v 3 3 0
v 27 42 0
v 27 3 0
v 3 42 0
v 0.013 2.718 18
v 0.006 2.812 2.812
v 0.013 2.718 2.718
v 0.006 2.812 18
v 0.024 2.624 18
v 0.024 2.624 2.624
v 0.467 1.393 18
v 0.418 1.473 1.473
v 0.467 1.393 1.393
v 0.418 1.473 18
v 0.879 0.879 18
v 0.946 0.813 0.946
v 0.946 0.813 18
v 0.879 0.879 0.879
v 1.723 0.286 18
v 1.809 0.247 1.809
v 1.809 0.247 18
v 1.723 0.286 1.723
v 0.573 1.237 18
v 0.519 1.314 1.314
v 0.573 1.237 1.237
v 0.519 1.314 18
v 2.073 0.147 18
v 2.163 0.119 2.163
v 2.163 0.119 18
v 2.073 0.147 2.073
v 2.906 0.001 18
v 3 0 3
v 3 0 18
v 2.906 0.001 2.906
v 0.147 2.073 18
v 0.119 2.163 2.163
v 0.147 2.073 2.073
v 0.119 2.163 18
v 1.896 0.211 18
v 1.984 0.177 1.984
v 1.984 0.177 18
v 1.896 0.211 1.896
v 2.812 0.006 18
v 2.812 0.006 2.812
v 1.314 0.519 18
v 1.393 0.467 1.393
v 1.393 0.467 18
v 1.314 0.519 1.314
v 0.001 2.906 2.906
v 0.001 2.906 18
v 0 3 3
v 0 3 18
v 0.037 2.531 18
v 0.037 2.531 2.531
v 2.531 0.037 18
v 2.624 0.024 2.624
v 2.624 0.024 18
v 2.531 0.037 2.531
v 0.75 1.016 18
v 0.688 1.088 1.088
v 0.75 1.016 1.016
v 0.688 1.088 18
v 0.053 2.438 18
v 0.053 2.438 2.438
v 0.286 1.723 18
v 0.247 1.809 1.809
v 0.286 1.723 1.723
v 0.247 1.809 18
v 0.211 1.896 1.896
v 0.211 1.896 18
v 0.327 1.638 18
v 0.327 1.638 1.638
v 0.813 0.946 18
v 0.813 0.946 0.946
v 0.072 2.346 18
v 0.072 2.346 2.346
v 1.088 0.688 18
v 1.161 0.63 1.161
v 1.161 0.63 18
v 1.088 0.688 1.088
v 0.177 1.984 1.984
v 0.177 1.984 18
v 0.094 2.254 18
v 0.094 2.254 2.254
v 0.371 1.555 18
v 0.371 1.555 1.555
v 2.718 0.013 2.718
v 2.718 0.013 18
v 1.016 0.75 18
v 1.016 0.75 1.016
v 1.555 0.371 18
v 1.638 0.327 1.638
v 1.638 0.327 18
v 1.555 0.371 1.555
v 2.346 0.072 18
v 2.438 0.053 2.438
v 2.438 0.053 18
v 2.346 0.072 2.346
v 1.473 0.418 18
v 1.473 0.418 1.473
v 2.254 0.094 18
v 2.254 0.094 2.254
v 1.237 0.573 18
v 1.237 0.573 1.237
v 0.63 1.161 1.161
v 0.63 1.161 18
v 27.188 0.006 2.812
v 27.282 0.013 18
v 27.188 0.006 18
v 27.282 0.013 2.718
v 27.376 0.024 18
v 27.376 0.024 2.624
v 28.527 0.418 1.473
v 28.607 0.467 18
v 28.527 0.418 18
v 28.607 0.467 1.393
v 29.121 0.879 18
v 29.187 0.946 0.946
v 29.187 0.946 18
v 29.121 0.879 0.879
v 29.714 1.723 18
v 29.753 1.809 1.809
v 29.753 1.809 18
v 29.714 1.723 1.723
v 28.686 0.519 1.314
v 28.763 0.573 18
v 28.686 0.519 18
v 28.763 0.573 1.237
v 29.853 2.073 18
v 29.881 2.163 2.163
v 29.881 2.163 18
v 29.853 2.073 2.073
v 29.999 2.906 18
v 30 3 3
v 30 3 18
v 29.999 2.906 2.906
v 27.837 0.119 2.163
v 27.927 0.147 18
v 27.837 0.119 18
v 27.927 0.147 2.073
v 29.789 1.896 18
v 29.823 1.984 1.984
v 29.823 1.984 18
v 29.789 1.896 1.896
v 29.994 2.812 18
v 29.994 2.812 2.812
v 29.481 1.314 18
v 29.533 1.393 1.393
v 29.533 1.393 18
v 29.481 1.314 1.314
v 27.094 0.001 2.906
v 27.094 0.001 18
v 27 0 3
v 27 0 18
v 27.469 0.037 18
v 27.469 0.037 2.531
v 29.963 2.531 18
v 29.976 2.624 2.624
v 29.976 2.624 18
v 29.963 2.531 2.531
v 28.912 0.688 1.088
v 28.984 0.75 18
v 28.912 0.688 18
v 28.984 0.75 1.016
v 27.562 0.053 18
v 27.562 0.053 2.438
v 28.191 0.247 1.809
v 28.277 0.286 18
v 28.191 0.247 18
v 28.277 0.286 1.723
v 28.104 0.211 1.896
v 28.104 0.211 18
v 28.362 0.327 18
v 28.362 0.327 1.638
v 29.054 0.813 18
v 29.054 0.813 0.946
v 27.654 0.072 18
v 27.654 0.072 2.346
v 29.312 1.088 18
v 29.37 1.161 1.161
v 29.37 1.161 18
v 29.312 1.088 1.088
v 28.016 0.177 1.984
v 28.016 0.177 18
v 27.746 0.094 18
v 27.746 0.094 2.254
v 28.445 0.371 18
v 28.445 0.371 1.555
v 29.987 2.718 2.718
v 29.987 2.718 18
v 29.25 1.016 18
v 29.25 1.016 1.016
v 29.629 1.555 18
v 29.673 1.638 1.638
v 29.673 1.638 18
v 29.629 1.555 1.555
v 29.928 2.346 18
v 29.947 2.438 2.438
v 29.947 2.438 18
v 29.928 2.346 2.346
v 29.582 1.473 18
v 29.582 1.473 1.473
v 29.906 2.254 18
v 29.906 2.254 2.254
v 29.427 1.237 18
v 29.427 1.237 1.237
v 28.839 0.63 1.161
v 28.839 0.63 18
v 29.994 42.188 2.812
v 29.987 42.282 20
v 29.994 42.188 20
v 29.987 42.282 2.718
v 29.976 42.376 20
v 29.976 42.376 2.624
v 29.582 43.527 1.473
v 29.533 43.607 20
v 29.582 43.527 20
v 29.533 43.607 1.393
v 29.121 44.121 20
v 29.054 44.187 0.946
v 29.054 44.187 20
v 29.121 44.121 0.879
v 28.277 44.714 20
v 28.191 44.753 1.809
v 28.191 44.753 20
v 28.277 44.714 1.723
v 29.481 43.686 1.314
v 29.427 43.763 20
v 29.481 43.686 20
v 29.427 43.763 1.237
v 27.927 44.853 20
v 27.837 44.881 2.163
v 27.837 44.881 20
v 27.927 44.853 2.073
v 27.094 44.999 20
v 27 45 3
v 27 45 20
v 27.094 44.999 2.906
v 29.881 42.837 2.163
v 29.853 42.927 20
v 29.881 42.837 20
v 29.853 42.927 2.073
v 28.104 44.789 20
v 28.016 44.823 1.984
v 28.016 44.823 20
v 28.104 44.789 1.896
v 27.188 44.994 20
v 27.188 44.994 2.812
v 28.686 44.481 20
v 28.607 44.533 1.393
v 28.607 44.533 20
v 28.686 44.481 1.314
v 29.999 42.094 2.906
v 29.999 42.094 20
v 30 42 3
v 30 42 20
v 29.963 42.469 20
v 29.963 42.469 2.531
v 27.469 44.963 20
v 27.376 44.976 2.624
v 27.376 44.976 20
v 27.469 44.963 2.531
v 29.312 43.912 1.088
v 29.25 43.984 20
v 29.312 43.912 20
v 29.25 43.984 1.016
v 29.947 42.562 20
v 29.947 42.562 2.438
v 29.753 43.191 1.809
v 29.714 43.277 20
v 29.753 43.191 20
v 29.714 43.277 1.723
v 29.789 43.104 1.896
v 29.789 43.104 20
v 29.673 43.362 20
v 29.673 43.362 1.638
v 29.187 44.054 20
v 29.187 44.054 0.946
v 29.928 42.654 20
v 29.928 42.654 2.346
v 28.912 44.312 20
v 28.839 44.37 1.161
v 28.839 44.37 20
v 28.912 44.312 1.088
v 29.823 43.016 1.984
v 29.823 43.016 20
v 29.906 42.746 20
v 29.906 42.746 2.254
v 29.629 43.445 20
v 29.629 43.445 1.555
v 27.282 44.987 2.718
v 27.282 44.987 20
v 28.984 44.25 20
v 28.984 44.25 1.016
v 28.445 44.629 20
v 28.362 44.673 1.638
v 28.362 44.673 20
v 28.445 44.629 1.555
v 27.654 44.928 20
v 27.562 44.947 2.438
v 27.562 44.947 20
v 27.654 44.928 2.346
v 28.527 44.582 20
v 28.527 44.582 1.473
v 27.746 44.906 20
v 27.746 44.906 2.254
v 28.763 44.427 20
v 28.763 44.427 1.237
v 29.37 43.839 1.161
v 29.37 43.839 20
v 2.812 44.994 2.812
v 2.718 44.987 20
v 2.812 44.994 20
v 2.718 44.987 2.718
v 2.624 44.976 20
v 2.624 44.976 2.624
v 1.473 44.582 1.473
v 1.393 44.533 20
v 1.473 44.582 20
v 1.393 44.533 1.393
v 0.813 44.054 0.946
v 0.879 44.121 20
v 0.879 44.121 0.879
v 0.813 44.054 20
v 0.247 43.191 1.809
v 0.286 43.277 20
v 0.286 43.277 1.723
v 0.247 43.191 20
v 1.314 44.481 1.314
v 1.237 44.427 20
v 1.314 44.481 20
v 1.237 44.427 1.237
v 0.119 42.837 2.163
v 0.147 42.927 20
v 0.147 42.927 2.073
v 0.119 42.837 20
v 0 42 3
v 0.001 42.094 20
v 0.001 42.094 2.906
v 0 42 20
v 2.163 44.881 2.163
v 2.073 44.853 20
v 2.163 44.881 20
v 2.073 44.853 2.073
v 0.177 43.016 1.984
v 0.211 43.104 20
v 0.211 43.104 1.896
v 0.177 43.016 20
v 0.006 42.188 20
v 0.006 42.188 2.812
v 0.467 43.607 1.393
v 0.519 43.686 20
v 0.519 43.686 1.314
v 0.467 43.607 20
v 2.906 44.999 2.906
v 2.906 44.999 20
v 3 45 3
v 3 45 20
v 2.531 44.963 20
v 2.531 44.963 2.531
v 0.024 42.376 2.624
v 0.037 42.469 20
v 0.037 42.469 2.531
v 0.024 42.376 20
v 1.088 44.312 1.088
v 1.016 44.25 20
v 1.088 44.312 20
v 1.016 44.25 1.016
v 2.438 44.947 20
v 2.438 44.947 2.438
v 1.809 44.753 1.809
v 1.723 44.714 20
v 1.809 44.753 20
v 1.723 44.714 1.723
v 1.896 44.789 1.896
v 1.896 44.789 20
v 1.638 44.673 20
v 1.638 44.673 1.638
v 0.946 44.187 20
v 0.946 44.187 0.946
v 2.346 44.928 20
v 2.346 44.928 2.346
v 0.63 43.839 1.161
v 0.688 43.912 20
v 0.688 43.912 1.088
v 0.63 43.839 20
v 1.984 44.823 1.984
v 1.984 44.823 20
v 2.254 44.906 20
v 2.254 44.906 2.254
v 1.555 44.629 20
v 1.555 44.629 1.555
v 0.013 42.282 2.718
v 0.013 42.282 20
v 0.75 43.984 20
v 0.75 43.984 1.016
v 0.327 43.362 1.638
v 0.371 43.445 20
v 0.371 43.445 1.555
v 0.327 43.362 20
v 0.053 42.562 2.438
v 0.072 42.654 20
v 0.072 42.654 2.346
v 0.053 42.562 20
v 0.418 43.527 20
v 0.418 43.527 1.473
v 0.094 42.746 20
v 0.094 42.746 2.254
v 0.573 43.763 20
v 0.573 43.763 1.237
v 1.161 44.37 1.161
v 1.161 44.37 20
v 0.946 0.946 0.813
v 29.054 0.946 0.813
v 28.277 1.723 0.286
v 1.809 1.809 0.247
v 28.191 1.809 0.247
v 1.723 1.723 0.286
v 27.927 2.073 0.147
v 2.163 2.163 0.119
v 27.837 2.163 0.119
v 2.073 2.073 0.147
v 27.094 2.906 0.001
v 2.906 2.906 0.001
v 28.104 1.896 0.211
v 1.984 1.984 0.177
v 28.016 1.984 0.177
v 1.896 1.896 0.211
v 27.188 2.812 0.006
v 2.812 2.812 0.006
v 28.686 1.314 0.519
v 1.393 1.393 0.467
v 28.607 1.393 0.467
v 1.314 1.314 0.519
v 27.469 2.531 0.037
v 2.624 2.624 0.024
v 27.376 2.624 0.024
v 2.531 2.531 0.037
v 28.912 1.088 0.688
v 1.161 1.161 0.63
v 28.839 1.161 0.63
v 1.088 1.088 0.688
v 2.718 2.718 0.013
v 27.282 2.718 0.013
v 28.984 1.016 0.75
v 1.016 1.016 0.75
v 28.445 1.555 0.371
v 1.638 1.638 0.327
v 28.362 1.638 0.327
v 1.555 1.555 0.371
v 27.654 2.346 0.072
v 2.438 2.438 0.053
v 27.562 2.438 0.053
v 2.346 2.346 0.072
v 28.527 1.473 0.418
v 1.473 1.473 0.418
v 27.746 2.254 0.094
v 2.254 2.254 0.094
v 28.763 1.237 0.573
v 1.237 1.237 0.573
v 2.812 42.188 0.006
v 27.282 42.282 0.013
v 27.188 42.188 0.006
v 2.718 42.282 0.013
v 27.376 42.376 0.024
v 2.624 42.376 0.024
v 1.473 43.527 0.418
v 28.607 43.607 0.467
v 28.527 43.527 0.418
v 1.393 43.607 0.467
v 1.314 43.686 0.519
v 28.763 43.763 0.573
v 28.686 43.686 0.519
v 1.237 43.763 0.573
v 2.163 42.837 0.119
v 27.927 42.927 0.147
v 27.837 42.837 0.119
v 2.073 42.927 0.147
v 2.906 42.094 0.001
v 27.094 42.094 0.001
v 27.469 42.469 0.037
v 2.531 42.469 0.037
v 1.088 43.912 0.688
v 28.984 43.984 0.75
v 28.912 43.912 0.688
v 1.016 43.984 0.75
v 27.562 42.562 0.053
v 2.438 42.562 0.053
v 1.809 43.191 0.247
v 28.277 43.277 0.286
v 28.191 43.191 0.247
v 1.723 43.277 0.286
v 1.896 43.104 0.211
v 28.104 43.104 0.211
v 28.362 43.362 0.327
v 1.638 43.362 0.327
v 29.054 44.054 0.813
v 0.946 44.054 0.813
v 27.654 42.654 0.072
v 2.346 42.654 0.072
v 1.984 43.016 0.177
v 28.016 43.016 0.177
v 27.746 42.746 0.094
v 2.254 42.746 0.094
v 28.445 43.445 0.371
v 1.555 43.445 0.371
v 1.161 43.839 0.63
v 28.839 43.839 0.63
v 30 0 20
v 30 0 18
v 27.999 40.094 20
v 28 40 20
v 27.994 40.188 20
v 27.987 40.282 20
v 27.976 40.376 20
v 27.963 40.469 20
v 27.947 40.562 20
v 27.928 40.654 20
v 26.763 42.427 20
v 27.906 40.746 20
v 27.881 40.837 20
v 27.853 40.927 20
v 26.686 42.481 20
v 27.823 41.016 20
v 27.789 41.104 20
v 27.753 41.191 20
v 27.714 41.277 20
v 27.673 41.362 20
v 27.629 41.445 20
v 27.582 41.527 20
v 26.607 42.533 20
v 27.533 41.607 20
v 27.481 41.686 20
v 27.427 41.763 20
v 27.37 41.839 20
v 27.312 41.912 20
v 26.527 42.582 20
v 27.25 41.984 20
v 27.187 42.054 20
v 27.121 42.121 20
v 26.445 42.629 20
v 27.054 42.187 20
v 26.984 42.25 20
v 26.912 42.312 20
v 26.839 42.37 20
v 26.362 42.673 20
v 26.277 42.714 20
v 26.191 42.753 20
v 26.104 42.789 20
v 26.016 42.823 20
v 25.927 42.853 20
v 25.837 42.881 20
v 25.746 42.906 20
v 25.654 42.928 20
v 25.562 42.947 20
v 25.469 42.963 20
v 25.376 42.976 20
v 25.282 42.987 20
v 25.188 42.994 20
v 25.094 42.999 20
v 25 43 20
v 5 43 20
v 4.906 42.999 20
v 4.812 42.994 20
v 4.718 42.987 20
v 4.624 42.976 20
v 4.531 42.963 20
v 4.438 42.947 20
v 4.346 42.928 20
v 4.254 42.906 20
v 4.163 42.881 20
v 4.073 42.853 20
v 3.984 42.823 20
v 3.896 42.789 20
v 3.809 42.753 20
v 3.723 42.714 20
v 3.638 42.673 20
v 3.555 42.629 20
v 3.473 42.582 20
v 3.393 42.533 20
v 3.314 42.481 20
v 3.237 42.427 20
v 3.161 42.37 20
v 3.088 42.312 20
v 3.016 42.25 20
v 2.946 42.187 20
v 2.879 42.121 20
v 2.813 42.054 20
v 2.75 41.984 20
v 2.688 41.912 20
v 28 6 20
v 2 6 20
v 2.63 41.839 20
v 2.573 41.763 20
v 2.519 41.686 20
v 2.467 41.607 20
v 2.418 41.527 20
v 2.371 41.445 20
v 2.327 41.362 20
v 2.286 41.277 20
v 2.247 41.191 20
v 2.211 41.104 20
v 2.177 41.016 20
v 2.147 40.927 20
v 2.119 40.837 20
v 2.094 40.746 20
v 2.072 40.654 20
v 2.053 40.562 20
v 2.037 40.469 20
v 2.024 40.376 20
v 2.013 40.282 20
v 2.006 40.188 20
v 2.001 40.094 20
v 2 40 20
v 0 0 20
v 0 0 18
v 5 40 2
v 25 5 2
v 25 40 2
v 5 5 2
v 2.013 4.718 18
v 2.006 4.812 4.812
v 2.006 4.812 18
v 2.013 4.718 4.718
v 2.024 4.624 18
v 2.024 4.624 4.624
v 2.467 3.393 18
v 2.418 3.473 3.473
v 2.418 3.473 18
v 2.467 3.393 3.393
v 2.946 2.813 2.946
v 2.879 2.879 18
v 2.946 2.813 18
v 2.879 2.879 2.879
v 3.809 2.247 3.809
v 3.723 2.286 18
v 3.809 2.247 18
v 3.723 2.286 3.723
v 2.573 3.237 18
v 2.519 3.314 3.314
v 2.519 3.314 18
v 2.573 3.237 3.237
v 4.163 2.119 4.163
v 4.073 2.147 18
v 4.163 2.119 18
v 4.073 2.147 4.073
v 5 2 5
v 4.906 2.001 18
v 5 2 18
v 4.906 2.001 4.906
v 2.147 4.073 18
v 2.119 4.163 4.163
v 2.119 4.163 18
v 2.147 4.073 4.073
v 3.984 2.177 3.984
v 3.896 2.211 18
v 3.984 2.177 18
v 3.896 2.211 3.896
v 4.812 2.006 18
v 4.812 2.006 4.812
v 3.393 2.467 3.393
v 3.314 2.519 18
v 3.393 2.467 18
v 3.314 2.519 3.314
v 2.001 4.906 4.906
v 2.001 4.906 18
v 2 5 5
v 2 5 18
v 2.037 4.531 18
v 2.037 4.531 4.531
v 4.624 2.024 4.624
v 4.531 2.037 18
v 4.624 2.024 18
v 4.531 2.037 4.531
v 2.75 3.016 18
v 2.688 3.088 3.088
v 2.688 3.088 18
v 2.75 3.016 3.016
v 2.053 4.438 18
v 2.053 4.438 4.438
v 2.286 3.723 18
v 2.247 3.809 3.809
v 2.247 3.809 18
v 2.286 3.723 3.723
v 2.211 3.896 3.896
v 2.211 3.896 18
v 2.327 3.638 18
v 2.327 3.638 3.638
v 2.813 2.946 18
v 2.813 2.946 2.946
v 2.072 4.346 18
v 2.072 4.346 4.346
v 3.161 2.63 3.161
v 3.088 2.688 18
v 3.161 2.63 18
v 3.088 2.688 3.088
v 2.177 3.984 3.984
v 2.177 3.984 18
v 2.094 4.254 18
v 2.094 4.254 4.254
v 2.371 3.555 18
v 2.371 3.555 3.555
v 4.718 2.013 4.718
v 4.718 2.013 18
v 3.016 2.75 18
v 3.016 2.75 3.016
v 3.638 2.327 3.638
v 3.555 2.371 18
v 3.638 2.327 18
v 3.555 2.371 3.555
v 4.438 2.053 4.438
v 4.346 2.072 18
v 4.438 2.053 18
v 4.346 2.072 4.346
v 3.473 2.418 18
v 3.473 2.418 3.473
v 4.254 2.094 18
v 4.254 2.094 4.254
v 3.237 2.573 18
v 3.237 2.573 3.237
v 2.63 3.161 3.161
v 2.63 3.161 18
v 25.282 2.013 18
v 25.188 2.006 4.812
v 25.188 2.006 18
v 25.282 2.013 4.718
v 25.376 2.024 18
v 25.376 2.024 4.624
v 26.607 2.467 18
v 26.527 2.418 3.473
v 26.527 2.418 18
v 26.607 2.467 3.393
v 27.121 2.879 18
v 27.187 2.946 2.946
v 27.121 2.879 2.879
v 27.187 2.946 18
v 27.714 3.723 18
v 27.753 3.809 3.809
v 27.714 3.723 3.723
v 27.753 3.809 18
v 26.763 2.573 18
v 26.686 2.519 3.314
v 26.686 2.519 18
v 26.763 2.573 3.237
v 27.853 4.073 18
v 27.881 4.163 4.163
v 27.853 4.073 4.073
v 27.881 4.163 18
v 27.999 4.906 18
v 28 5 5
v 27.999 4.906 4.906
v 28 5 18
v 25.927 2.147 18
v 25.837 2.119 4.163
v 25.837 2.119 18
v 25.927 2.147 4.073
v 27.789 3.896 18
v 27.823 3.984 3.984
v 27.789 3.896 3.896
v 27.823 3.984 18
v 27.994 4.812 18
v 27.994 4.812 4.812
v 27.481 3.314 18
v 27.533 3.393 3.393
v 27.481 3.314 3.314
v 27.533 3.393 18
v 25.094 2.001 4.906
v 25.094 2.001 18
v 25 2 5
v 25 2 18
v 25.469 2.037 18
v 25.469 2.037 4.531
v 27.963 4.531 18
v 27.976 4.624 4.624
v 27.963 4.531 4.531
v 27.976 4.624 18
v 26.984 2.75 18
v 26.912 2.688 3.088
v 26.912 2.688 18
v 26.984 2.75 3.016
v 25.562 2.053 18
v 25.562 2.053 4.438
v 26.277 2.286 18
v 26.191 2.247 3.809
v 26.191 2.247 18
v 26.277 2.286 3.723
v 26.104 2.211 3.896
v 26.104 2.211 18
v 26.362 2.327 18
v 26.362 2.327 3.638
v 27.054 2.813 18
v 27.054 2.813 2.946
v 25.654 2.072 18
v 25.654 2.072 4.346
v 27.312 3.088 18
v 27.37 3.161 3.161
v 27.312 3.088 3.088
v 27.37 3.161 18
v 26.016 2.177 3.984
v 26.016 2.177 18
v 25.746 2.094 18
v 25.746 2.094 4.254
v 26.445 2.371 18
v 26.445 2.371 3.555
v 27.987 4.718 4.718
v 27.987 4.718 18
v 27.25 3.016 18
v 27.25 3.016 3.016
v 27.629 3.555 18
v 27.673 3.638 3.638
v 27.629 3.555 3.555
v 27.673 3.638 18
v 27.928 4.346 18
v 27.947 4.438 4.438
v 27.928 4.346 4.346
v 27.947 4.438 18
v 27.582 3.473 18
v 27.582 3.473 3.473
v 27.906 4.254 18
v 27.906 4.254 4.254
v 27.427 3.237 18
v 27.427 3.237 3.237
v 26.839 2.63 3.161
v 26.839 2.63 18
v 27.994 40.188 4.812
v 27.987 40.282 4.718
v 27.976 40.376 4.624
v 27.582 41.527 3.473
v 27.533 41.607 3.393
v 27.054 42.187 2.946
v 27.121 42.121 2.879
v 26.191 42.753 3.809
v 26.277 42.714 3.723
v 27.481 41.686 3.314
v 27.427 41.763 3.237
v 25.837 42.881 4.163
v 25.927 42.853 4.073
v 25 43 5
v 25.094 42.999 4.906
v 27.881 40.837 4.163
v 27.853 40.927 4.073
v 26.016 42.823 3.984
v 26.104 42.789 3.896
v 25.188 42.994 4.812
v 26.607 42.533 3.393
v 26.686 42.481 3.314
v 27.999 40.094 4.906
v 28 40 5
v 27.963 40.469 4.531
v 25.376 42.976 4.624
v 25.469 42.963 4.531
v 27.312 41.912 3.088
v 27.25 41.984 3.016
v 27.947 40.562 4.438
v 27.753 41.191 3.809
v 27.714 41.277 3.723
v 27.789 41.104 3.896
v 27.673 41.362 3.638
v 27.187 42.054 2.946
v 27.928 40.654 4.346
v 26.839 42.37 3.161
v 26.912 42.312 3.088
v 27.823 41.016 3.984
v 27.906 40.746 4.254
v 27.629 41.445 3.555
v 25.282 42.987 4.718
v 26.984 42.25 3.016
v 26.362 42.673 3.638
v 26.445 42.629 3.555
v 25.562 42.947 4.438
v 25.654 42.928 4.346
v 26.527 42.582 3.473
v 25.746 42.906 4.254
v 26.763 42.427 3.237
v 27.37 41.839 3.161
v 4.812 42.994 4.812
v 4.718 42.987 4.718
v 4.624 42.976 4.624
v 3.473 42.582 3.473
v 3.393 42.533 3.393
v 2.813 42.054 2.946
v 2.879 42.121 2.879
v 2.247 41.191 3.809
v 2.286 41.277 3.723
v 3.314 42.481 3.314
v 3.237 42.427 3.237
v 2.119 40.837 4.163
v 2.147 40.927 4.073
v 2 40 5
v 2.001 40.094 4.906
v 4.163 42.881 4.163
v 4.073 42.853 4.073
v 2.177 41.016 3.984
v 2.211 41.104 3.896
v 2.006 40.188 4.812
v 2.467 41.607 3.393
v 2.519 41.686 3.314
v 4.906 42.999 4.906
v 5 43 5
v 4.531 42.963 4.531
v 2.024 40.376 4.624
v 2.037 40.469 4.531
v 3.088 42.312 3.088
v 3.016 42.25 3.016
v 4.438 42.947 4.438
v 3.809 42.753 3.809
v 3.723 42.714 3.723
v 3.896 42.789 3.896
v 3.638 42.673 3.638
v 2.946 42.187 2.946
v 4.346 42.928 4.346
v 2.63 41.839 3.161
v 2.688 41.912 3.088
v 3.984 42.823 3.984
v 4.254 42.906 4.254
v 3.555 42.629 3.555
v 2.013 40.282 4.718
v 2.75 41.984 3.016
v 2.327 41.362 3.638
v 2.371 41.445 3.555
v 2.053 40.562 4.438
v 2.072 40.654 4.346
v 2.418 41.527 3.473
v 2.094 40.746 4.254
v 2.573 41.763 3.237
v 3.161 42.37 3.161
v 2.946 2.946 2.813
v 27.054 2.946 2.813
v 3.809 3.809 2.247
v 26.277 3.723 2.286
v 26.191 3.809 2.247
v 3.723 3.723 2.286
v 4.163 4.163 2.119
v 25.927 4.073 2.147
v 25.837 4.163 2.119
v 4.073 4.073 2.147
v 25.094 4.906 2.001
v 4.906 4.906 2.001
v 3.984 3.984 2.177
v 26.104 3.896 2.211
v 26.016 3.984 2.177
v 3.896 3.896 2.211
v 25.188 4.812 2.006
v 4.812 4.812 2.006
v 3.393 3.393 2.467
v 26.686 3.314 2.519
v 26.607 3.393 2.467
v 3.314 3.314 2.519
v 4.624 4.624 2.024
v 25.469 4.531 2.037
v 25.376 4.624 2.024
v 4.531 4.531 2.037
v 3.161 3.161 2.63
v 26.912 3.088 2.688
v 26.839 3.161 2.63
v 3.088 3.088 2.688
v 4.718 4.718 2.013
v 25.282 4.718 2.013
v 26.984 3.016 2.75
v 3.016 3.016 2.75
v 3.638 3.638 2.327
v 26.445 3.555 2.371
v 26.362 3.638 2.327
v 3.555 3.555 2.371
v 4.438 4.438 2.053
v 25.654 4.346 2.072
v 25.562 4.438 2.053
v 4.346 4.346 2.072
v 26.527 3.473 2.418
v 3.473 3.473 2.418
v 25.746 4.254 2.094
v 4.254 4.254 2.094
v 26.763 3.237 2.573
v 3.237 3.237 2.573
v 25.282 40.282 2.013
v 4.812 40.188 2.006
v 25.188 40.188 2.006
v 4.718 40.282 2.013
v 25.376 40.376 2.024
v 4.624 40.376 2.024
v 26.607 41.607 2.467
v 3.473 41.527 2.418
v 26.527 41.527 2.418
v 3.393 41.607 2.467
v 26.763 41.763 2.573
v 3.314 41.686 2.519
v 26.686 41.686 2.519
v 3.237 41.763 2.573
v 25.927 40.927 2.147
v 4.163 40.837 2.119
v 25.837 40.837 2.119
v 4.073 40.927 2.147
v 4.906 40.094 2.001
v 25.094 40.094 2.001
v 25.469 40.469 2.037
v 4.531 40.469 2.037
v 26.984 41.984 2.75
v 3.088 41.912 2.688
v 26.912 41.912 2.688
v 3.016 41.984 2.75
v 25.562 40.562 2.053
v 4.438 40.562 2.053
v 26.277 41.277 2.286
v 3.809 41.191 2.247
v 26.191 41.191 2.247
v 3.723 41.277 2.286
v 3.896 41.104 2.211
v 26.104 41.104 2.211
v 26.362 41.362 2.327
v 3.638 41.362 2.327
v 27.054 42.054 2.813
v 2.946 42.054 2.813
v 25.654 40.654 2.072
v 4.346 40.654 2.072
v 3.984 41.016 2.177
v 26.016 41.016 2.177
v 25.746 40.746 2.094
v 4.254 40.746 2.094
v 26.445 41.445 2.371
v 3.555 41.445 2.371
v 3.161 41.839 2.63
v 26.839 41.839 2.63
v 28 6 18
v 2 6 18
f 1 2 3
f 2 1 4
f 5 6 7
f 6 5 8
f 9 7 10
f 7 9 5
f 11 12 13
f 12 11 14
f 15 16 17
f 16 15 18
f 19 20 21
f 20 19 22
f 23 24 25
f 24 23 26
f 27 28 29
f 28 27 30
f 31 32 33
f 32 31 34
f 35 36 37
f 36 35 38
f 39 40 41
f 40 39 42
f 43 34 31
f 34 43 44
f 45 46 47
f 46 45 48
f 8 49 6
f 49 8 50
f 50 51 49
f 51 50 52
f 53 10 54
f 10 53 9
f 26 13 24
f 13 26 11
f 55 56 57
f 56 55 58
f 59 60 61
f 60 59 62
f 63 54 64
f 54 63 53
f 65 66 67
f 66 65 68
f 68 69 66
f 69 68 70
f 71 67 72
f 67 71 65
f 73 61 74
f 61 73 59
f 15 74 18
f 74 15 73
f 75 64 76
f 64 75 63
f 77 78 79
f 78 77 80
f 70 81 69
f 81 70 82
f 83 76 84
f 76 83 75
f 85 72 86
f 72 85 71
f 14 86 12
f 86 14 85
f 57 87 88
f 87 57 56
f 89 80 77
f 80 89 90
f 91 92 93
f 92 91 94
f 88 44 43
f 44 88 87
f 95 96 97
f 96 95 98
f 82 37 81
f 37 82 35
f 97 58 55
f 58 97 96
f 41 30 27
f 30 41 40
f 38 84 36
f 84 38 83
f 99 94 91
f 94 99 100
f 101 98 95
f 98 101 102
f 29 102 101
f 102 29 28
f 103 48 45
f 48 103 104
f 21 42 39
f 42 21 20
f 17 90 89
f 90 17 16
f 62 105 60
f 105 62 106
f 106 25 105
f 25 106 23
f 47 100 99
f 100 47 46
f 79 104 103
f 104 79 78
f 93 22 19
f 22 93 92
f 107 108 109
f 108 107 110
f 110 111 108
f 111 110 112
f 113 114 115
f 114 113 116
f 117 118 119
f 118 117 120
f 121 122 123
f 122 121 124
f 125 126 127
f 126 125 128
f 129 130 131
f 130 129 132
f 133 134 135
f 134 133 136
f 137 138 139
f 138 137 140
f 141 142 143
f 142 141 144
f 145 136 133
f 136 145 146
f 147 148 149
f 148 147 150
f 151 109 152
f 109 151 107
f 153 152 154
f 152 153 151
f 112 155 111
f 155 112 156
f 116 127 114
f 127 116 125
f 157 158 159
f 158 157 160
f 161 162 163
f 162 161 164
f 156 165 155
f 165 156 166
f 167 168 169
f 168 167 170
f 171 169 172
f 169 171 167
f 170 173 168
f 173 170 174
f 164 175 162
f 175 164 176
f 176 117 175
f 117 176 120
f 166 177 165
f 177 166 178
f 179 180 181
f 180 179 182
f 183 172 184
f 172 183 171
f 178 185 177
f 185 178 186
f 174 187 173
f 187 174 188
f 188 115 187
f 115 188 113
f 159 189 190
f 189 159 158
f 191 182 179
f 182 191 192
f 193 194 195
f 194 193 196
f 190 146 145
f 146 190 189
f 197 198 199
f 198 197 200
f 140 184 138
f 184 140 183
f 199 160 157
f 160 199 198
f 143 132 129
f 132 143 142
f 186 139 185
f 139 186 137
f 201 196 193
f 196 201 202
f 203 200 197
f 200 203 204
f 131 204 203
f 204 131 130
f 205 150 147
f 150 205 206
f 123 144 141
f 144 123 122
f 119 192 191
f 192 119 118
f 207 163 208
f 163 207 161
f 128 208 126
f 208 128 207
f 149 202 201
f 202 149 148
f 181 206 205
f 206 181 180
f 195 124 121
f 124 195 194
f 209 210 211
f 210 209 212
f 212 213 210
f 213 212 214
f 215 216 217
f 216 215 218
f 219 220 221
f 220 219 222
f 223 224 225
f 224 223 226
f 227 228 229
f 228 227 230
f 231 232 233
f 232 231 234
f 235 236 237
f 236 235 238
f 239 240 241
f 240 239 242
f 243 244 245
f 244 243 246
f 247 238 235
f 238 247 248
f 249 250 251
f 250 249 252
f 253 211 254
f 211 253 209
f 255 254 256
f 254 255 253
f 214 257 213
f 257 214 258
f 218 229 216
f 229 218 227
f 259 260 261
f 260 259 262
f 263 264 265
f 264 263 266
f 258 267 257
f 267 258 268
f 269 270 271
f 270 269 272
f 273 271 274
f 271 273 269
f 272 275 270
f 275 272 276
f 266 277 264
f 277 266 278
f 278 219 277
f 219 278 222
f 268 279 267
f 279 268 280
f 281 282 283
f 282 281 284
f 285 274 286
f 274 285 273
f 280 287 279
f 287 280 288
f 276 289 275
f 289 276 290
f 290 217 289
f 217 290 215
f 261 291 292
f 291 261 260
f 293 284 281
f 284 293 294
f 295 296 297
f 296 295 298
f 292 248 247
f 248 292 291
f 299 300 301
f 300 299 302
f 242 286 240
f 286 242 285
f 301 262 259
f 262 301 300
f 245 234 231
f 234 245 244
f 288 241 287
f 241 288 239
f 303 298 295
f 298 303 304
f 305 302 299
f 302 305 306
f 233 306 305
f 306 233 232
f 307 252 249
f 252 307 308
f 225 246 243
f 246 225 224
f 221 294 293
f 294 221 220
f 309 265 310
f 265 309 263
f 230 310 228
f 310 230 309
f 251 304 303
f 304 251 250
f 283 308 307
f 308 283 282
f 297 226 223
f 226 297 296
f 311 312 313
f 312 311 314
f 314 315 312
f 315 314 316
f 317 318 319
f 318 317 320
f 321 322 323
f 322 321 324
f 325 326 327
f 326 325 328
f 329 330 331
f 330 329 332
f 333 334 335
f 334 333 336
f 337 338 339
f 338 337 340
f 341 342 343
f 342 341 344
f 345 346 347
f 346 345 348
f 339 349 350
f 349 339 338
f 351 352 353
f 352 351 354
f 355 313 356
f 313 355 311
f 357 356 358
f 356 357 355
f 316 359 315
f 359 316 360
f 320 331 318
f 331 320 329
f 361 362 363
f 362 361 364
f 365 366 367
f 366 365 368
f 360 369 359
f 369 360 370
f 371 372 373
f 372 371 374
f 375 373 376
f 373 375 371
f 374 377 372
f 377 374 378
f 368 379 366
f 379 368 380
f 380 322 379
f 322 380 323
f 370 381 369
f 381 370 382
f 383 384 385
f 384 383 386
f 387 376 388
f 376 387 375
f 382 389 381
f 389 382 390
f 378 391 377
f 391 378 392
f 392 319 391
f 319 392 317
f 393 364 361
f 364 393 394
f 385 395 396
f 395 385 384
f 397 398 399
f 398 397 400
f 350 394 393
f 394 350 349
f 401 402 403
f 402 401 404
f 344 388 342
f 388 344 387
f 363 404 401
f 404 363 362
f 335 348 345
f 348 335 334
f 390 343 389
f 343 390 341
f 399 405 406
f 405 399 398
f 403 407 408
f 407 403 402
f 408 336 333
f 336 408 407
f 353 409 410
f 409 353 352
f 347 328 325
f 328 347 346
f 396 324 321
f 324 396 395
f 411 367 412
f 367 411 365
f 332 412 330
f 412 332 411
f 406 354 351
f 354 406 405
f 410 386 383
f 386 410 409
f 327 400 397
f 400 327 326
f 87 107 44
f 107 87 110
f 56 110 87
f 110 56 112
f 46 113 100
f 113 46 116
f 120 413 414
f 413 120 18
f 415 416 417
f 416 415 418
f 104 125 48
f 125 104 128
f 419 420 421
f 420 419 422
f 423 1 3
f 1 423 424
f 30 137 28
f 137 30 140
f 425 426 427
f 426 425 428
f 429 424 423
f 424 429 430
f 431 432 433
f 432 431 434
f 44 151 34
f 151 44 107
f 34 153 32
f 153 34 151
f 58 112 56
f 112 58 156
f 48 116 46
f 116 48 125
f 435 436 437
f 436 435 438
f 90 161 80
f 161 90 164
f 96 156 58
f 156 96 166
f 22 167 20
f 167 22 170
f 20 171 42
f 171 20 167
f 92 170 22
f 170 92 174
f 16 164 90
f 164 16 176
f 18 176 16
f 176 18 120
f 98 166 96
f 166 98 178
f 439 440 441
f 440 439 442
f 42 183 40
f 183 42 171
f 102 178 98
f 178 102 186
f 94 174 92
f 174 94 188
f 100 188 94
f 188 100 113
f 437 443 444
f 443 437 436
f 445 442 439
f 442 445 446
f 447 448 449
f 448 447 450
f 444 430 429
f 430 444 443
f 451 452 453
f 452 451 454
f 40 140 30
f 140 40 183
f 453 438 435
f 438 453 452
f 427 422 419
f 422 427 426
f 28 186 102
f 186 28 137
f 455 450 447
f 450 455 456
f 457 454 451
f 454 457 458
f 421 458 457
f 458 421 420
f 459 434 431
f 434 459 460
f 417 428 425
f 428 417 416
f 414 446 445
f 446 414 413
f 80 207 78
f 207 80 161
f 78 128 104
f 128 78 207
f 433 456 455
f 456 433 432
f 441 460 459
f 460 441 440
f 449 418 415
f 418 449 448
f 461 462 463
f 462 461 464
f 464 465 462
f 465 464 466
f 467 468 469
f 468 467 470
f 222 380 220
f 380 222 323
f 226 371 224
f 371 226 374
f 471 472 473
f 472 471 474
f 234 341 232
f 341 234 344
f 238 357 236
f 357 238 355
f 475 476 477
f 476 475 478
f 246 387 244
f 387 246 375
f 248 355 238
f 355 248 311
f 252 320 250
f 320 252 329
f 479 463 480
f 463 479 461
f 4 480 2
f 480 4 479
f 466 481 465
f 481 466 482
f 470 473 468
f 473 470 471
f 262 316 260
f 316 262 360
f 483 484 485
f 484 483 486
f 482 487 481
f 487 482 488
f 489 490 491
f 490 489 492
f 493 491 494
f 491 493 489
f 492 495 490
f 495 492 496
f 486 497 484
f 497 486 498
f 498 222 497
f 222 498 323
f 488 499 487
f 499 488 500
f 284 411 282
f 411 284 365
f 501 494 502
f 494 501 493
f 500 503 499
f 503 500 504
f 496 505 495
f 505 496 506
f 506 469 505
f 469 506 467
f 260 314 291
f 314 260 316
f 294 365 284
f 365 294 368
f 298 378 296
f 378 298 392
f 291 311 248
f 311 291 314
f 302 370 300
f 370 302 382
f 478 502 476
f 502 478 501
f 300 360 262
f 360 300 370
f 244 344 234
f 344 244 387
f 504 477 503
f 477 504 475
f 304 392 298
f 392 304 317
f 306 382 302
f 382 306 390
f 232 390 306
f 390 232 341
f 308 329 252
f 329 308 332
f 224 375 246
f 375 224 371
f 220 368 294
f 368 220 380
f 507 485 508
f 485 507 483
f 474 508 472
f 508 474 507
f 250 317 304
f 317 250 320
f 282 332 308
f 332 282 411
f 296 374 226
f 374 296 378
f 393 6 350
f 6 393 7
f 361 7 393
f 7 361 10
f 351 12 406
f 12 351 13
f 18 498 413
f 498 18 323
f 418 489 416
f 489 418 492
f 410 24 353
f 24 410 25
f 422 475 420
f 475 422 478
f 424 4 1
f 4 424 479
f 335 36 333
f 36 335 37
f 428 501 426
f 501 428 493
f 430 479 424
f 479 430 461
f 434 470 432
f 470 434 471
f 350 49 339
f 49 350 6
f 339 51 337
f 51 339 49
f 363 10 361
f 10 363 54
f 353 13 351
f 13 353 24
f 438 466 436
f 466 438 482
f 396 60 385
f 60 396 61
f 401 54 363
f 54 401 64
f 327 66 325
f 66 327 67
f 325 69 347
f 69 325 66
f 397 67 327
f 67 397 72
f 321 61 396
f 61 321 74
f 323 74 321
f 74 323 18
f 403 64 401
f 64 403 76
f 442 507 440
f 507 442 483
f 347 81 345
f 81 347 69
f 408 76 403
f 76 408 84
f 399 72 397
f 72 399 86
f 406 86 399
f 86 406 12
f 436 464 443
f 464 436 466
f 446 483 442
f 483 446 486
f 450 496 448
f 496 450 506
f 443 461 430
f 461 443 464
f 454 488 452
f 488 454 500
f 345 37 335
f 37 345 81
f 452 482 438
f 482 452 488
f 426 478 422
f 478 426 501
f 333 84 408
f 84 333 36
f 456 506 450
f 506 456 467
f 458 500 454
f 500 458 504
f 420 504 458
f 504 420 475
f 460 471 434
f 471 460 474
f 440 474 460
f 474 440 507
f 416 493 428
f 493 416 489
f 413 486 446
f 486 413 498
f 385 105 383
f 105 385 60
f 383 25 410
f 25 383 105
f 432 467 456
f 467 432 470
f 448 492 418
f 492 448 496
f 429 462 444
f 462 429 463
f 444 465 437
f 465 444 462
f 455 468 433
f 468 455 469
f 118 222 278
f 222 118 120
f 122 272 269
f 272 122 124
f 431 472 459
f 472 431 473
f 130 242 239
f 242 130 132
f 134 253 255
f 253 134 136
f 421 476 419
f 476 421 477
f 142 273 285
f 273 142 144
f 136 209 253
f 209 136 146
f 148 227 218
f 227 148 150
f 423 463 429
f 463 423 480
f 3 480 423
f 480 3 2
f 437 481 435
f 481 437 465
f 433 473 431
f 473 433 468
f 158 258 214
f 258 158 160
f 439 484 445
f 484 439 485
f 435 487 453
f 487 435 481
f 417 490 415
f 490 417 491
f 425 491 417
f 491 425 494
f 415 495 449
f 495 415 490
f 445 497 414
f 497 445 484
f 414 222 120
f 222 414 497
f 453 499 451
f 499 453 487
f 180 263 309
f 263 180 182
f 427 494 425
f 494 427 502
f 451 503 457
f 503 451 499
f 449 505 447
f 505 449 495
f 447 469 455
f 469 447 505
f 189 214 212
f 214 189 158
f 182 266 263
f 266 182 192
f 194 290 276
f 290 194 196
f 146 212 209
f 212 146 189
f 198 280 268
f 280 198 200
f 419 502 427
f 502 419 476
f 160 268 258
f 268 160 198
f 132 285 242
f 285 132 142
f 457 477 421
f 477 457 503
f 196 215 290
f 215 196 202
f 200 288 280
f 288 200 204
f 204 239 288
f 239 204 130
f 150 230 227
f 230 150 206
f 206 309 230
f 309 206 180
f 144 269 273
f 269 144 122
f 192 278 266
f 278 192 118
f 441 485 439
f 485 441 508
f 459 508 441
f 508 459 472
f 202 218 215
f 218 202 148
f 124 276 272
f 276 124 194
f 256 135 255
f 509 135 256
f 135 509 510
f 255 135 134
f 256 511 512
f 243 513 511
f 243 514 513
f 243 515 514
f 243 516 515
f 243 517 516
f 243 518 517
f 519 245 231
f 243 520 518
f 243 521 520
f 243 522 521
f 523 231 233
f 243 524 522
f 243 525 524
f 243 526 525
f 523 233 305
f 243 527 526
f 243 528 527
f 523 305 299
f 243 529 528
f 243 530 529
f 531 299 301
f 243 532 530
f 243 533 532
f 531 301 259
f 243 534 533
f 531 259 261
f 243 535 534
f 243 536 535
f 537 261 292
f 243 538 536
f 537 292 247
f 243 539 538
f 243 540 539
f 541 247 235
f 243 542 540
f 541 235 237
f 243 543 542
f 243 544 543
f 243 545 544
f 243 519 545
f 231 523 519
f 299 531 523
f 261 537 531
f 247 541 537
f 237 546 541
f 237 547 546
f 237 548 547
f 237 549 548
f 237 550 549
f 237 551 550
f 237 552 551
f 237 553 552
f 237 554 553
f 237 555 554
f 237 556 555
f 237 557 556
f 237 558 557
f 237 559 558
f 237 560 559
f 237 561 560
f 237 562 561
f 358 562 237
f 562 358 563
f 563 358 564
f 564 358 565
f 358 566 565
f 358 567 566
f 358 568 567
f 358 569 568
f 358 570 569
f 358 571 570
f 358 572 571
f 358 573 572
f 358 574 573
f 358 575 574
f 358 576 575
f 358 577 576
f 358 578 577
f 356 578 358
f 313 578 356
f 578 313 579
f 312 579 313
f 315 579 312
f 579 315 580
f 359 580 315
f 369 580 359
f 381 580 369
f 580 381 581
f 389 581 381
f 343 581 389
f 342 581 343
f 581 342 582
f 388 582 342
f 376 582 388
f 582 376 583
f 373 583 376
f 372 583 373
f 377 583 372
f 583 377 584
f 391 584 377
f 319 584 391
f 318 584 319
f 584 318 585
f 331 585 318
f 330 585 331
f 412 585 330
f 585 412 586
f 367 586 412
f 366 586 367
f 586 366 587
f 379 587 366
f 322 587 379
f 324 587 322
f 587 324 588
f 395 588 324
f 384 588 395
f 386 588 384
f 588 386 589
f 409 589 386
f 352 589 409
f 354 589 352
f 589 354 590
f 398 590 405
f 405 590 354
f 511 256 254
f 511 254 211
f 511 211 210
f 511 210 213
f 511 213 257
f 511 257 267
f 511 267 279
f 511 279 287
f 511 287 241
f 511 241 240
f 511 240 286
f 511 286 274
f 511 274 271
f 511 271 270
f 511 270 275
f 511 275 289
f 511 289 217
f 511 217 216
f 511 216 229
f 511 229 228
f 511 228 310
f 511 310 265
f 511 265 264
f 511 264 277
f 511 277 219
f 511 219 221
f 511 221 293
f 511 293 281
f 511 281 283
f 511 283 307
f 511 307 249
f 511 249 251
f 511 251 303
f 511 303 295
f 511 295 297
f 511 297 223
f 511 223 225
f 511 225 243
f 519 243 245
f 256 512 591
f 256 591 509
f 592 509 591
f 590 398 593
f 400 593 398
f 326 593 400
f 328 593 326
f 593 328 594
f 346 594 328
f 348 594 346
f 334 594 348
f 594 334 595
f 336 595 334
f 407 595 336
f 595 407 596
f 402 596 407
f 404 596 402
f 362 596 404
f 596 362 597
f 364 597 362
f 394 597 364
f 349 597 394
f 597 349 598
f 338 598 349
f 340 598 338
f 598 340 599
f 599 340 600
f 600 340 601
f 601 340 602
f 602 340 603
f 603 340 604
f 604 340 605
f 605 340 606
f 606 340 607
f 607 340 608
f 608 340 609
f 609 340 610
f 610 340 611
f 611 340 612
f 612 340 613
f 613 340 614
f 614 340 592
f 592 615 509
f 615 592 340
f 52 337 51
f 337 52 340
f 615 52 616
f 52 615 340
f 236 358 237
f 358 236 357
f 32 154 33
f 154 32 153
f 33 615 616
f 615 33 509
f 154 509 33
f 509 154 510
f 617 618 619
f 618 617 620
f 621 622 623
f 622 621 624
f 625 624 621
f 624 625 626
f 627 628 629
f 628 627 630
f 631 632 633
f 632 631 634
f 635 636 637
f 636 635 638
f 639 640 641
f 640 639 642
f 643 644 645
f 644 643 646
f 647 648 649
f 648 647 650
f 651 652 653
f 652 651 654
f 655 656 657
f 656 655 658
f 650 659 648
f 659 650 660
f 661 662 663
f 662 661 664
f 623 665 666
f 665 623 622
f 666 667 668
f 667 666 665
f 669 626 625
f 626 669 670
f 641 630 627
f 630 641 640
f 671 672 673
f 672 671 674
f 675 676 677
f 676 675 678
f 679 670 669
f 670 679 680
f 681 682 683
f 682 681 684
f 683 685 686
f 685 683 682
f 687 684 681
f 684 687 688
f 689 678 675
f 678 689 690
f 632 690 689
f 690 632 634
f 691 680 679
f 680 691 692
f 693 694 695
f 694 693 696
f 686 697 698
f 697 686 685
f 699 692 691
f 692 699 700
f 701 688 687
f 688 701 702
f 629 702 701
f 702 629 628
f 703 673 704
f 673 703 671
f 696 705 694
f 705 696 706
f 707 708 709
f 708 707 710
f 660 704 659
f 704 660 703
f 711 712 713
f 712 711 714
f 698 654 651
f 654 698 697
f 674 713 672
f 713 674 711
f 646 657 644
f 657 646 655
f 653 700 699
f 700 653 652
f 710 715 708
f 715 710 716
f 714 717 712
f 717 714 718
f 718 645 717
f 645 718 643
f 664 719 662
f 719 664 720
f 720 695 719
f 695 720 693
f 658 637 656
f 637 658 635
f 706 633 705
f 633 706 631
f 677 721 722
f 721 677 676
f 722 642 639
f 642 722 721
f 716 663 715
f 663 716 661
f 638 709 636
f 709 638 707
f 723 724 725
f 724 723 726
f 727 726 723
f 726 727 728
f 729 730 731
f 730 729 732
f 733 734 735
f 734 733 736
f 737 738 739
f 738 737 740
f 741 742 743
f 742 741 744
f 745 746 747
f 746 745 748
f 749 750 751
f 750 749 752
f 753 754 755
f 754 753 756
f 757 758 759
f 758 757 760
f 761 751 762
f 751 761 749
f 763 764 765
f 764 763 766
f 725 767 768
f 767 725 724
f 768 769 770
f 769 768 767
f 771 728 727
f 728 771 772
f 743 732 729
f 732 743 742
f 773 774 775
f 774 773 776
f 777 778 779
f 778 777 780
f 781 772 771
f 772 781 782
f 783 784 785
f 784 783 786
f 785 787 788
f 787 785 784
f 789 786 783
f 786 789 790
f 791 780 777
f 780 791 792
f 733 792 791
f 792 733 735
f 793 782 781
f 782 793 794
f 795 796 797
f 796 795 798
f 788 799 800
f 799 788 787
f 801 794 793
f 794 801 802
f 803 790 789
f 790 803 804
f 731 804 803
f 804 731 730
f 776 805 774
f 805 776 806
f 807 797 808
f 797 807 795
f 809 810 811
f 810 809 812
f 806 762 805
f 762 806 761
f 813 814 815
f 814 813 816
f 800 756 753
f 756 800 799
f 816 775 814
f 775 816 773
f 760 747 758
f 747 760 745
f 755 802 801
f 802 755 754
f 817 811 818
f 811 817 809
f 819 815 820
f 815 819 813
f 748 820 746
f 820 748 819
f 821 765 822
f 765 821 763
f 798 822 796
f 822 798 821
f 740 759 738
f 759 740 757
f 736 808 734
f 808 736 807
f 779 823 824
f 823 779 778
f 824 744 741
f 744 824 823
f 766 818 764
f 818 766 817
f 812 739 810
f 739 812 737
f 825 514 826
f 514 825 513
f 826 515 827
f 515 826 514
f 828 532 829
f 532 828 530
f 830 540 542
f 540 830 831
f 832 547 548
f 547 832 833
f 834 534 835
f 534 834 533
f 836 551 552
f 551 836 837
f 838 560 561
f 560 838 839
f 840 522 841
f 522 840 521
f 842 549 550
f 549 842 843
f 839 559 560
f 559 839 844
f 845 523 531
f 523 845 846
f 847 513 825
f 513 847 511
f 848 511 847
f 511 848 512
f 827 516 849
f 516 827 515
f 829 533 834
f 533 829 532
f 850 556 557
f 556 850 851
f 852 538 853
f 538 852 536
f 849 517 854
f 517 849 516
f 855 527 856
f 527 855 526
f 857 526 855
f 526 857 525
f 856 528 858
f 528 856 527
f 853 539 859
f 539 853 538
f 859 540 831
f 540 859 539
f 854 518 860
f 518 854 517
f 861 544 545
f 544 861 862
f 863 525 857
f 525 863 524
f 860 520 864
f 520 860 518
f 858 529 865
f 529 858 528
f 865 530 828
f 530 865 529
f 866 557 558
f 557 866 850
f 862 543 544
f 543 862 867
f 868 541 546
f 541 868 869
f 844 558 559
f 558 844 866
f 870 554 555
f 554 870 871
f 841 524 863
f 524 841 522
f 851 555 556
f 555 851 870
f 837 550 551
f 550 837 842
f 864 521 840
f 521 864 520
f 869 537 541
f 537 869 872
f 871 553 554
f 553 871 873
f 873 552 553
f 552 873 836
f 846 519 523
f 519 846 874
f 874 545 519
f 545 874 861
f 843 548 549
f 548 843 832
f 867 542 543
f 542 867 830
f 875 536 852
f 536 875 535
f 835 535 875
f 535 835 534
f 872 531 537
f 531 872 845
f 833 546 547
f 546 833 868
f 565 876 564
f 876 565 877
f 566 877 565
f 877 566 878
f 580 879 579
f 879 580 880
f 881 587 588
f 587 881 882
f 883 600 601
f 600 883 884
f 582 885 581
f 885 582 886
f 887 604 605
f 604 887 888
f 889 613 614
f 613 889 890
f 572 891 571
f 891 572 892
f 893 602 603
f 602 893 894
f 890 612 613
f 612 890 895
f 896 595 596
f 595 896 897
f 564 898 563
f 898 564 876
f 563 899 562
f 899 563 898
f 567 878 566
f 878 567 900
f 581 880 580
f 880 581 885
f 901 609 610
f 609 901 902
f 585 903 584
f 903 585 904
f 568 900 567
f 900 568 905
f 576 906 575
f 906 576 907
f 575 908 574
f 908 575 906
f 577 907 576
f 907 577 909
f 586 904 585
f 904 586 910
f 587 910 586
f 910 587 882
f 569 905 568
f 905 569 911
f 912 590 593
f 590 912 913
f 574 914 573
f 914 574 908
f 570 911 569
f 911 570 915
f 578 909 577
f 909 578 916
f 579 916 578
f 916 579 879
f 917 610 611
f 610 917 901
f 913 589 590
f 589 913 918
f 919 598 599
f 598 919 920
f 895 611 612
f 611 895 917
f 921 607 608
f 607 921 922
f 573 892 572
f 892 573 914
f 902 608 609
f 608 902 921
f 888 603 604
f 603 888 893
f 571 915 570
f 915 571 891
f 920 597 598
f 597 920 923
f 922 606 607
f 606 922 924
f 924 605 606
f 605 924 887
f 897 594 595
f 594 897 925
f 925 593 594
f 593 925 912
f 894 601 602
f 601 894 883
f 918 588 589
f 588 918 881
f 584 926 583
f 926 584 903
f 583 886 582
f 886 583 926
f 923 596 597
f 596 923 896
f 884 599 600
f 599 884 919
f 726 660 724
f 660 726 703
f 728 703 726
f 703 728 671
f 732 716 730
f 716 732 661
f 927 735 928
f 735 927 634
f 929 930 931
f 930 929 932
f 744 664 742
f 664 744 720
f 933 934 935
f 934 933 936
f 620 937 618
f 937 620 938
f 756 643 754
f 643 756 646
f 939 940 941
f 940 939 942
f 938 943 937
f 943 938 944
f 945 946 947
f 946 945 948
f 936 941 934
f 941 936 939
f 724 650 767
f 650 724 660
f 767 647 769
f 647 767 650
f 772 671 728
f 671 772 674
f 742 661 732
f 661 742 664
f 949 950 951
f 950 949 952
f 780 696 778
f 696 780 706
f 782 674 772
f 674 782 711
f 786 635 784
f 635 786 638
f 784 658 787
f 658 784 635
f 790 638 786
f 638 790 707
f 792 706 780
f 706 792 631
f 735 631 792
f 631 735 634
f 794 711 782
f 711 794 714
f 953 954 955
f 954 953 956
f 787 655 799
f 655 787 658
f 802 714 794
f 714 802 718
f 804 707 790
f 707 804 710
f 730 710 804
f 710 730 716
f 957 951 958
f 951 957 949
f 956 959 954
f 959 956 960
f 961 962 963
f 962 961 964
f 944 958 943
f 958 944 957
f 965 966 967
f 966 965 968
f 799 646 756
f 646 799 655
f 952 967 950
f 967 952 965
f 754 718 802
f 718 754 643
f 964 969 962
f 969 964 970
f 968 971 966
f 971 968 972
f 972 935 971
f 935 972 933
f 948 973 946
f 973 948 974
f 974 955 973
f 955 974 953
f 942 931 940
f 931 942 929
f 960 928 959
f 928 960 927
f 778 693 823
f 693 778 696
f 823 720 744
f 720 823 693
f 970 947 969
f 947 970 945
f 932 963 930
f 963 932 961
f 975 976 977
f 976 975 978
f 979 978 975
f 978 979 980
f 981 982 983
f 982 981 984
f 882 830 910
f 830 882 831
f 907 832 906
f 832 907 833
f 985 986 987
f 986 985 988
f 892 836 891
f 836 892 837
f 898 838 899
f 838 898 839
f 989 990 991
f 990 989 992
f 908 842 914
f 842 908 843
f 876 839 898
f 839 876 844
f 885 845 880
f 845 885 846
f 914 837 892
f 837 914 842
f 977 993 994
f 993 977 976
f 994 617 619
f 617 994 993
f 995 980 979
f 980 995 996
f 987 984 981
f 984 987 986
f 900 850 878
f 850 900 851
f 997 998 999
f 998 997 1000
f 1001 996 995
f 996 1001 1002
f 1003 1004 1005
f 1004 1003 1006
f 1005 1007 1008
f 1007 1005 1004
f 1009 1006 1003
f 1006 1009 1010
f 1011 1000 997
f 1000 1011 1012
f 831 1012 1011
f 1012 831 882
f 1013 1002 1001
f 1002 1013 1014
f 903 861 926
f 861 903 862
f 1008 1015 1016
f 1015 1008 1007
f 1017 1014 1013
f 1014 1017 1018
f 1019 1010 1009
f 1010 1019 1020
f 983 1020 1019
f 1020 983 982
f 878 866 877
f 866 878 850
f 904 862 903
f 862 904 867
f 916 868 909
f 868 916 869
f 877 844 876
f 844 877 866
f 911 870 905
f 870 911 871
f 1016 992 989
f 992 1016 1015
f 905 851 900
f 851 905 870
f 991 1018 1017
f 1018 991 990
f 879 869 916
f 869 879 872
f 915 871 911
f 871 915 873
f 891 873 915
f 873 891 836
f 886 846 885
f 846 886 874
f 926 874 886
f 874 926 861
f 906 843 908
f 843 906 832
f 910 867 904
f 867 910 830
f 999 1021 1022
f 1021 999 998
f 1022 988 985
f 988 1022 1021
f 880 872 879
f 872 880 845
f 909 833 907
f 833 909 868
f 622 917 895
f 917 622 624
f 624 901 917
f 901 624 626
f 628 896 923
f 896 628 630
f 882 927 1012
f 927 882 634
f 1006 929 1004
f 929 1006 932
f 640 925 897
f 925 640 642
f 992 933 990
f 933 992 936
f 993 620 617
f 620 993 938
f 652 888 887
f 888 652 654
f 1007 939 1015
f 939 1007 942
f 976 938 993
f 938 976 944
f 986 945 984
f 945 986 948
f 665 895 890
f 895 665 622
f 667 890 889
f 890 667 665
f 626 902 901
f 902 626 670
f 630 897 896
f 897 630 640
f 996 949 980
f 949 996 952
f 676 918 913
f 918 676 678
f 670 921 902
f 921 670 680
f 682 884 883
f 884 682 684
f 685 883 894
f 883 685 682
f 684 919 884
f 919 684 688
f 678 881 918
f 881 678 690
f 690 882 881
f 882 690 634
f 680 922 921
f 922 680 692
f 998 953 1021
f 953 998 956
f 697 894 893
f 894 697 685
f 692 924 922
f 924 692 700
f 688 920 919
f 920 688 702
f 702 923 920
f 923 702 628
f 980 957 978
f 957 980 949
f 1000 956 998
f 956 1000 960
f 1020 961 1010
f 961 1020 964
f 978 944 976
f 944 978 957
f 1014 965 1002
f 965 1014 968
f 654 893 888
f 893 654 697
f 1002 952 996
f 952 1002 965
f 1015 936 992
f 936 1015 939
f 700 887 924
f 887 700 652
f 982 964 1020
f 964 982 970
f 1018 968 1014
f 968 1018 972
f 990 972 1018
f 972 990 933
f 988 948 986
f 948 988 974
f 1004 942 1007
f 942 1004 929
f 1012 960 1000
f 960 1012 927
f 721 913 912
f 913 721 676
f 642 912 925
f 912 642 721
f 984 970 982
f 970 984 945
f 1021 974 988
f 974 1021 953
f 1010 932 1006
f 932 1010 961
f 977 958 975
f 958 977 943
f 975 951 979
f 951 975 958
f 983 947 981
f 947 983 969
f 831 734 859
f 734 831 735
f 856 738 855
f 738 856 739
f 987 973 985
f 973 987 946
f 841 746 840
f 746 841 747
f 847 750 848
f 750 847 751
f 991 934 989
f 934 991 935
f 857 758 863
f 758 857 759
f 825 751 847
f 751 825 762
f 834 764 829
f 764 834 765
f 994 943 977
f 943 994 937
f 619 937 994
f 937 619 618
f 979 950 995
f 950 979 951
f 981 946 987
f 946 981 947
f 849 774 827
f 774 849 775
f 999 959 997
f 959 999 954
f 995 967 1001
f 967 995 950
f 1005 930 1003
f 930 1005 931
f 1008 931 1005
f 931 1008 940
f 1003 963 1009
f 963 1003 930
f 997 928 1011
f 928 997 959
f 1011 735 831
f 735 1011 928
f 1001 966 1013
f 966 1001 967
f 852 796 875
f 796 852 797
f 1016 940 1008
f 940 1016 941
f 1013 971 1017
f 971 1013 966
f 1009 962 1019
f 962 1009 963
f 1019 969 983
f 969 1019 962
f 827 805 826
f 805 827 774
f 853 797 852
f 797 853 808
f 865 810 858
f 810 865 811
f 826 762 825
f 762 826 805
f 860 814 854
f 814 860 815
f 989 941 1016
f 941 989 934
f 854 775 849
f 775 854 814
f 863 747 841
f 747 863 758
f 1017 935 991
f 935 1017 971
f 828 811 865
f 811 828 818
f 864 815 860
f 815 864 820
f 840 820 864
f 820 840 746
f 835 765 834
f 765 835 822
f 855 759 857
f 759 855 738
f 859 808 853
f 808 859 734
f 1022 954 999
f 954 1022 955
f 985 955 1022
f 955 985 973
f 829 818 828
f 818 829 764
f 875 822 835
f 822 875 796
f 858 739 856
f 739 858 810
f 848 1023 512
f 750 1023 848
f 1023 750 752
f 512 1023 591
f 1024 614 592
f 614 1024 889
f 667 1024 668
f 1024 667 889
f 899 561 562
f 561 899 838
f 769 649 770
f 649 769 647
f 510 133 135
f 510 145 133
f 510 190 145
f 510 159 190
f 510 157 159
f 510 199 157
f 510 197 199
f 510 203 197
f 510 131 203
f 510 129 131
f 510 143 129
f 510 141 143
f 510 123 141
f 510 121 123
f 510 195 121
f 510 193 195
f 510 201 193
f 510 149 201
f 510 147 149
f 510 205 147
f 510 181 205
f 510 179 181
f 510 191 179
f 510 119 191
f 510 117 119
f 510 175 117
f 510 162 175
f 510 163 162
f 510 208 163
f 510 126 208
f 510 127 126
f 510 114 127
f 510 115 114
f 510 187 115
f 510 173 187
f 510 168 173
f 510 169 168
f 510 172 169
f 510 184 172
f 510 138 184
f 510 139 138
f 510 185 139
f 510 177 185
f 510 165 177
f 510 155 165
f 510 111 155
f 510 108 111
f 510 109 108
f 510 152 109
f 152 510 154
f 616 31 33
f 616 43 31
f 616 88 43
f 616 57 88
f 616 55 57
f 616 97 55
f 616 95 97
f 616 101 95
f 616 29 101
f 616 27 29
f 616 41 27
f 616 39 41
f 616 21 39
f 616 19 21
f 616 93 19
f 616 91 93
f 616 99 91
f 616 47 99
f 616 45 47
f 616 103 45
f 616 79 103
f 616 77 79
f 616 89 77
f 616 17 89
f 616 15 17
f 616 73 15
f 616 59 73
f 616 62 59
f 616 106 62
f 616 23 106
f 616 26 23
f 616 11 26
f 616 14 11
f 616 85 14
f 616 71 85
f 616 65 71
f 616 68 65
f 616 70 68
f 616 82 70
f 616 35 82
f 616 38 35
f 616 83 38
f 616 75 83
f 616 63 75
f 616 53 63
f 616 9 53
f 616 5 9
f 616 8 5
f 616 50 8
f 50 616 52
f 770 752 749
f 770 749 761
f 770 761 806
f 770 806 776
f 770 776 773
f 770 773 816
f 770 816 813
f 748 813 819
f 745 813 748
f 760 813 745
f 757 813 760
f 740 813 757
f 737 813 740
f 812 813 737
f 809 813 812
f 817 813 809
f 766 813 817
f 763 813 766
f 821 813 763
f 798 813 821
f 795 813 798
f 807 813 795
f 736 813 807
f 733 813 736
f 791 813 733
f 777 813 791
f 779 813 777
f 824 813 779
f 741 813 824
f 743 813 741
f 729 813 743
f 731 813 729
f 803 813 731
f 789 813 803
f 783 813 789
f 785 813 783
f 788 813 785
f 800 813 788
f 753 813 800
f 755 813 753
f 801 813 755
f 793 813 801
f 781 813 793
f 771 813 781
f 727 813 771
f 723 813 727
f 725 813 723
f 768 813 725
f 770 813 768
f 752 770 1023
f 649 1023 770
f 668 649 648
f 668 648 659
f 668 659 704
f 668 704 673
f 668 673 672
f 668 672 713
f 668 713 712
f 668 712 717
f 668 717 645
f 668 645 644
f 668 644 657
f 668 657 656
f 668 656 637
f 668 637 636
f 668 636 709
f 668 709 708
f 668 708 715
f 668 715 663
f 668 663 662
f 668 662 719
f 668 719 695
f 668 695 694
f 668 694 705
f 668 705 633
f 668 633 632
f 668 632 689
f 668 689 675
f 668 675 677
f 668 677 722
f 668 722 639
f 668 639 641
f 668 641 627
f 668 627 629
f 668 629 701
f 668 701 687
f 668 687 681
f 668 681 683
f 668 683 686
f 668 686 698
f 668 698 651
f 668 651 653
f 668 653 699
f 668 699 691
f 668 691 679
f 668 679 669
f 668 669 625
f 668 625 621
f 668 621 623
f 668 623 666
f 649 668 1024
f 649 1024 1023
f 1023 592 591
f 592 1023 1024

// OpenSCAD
$fn=200;

length = 45;
width = 30;
height = 20;
cornerRadius = 3;
thickness = 2;
lipDepth = 6;

translate([0, 0, 0]) {
    box(length, width, height, cornerRadius, thickness, lipDepth);
}

module box(length, width, height, radius, thickness, lipDepth) {
    thickness2 = 2*thickness;
    union(){
        difference() {
            boxpart(length, width, height, radius);
            translate([thickness, thickness, thickness]) 
              boxpart(length-thickness2, width-thickness2, height-thickness+0.01, radius);
        }
        if (lipDepth > 0) {
            translate([0, 0, height-thickness]) cube([width, lipDepth, thickness]);
        }
    }
}

module boxpart(length, width, height, radius) {
    difference() {
        cube(size=[width, length, height]);
        // The intersection of these will give corners which are imperfect,
        // but good enough.
        rounderZ(length, width, height+0.2, radius);
        rounderXL(length, width, height, radius);
        rounderYL(length, width, height, radius);
    }
}

module rounderZ(length, width, height, radius) {
    rounder2(height, radius, width);
    translate([width, length, 0]) rotate([0, 0, 180]) rounder2(height, radius, width);
}

module rounderXL(length, width, height, radius) {
    rotate([90, 0, 90]) rounder2(width, radius, length);
}

module rounderYL(length, width, height, radius) {
    translate([0, length, 0]) rotate([90, 0, 0]) rounder2(length, radius, width);
}

module rounder2(height, radius, spacing) {
    rounder(height, radius);
    translate([spacing, 0, 0]) rotate([0, 0, 90]) rounder(height, radius);
}

module rounder(height, radius) {
    slop = 0.2;
    difference() {
        translate([-radius, -radius, 0]) cube(size=[radius*2, radius*2, height]);
        translate([radius, radius, -slop/2]) cylinder(h=height+slop, r=radius, center=false);
    }
}
